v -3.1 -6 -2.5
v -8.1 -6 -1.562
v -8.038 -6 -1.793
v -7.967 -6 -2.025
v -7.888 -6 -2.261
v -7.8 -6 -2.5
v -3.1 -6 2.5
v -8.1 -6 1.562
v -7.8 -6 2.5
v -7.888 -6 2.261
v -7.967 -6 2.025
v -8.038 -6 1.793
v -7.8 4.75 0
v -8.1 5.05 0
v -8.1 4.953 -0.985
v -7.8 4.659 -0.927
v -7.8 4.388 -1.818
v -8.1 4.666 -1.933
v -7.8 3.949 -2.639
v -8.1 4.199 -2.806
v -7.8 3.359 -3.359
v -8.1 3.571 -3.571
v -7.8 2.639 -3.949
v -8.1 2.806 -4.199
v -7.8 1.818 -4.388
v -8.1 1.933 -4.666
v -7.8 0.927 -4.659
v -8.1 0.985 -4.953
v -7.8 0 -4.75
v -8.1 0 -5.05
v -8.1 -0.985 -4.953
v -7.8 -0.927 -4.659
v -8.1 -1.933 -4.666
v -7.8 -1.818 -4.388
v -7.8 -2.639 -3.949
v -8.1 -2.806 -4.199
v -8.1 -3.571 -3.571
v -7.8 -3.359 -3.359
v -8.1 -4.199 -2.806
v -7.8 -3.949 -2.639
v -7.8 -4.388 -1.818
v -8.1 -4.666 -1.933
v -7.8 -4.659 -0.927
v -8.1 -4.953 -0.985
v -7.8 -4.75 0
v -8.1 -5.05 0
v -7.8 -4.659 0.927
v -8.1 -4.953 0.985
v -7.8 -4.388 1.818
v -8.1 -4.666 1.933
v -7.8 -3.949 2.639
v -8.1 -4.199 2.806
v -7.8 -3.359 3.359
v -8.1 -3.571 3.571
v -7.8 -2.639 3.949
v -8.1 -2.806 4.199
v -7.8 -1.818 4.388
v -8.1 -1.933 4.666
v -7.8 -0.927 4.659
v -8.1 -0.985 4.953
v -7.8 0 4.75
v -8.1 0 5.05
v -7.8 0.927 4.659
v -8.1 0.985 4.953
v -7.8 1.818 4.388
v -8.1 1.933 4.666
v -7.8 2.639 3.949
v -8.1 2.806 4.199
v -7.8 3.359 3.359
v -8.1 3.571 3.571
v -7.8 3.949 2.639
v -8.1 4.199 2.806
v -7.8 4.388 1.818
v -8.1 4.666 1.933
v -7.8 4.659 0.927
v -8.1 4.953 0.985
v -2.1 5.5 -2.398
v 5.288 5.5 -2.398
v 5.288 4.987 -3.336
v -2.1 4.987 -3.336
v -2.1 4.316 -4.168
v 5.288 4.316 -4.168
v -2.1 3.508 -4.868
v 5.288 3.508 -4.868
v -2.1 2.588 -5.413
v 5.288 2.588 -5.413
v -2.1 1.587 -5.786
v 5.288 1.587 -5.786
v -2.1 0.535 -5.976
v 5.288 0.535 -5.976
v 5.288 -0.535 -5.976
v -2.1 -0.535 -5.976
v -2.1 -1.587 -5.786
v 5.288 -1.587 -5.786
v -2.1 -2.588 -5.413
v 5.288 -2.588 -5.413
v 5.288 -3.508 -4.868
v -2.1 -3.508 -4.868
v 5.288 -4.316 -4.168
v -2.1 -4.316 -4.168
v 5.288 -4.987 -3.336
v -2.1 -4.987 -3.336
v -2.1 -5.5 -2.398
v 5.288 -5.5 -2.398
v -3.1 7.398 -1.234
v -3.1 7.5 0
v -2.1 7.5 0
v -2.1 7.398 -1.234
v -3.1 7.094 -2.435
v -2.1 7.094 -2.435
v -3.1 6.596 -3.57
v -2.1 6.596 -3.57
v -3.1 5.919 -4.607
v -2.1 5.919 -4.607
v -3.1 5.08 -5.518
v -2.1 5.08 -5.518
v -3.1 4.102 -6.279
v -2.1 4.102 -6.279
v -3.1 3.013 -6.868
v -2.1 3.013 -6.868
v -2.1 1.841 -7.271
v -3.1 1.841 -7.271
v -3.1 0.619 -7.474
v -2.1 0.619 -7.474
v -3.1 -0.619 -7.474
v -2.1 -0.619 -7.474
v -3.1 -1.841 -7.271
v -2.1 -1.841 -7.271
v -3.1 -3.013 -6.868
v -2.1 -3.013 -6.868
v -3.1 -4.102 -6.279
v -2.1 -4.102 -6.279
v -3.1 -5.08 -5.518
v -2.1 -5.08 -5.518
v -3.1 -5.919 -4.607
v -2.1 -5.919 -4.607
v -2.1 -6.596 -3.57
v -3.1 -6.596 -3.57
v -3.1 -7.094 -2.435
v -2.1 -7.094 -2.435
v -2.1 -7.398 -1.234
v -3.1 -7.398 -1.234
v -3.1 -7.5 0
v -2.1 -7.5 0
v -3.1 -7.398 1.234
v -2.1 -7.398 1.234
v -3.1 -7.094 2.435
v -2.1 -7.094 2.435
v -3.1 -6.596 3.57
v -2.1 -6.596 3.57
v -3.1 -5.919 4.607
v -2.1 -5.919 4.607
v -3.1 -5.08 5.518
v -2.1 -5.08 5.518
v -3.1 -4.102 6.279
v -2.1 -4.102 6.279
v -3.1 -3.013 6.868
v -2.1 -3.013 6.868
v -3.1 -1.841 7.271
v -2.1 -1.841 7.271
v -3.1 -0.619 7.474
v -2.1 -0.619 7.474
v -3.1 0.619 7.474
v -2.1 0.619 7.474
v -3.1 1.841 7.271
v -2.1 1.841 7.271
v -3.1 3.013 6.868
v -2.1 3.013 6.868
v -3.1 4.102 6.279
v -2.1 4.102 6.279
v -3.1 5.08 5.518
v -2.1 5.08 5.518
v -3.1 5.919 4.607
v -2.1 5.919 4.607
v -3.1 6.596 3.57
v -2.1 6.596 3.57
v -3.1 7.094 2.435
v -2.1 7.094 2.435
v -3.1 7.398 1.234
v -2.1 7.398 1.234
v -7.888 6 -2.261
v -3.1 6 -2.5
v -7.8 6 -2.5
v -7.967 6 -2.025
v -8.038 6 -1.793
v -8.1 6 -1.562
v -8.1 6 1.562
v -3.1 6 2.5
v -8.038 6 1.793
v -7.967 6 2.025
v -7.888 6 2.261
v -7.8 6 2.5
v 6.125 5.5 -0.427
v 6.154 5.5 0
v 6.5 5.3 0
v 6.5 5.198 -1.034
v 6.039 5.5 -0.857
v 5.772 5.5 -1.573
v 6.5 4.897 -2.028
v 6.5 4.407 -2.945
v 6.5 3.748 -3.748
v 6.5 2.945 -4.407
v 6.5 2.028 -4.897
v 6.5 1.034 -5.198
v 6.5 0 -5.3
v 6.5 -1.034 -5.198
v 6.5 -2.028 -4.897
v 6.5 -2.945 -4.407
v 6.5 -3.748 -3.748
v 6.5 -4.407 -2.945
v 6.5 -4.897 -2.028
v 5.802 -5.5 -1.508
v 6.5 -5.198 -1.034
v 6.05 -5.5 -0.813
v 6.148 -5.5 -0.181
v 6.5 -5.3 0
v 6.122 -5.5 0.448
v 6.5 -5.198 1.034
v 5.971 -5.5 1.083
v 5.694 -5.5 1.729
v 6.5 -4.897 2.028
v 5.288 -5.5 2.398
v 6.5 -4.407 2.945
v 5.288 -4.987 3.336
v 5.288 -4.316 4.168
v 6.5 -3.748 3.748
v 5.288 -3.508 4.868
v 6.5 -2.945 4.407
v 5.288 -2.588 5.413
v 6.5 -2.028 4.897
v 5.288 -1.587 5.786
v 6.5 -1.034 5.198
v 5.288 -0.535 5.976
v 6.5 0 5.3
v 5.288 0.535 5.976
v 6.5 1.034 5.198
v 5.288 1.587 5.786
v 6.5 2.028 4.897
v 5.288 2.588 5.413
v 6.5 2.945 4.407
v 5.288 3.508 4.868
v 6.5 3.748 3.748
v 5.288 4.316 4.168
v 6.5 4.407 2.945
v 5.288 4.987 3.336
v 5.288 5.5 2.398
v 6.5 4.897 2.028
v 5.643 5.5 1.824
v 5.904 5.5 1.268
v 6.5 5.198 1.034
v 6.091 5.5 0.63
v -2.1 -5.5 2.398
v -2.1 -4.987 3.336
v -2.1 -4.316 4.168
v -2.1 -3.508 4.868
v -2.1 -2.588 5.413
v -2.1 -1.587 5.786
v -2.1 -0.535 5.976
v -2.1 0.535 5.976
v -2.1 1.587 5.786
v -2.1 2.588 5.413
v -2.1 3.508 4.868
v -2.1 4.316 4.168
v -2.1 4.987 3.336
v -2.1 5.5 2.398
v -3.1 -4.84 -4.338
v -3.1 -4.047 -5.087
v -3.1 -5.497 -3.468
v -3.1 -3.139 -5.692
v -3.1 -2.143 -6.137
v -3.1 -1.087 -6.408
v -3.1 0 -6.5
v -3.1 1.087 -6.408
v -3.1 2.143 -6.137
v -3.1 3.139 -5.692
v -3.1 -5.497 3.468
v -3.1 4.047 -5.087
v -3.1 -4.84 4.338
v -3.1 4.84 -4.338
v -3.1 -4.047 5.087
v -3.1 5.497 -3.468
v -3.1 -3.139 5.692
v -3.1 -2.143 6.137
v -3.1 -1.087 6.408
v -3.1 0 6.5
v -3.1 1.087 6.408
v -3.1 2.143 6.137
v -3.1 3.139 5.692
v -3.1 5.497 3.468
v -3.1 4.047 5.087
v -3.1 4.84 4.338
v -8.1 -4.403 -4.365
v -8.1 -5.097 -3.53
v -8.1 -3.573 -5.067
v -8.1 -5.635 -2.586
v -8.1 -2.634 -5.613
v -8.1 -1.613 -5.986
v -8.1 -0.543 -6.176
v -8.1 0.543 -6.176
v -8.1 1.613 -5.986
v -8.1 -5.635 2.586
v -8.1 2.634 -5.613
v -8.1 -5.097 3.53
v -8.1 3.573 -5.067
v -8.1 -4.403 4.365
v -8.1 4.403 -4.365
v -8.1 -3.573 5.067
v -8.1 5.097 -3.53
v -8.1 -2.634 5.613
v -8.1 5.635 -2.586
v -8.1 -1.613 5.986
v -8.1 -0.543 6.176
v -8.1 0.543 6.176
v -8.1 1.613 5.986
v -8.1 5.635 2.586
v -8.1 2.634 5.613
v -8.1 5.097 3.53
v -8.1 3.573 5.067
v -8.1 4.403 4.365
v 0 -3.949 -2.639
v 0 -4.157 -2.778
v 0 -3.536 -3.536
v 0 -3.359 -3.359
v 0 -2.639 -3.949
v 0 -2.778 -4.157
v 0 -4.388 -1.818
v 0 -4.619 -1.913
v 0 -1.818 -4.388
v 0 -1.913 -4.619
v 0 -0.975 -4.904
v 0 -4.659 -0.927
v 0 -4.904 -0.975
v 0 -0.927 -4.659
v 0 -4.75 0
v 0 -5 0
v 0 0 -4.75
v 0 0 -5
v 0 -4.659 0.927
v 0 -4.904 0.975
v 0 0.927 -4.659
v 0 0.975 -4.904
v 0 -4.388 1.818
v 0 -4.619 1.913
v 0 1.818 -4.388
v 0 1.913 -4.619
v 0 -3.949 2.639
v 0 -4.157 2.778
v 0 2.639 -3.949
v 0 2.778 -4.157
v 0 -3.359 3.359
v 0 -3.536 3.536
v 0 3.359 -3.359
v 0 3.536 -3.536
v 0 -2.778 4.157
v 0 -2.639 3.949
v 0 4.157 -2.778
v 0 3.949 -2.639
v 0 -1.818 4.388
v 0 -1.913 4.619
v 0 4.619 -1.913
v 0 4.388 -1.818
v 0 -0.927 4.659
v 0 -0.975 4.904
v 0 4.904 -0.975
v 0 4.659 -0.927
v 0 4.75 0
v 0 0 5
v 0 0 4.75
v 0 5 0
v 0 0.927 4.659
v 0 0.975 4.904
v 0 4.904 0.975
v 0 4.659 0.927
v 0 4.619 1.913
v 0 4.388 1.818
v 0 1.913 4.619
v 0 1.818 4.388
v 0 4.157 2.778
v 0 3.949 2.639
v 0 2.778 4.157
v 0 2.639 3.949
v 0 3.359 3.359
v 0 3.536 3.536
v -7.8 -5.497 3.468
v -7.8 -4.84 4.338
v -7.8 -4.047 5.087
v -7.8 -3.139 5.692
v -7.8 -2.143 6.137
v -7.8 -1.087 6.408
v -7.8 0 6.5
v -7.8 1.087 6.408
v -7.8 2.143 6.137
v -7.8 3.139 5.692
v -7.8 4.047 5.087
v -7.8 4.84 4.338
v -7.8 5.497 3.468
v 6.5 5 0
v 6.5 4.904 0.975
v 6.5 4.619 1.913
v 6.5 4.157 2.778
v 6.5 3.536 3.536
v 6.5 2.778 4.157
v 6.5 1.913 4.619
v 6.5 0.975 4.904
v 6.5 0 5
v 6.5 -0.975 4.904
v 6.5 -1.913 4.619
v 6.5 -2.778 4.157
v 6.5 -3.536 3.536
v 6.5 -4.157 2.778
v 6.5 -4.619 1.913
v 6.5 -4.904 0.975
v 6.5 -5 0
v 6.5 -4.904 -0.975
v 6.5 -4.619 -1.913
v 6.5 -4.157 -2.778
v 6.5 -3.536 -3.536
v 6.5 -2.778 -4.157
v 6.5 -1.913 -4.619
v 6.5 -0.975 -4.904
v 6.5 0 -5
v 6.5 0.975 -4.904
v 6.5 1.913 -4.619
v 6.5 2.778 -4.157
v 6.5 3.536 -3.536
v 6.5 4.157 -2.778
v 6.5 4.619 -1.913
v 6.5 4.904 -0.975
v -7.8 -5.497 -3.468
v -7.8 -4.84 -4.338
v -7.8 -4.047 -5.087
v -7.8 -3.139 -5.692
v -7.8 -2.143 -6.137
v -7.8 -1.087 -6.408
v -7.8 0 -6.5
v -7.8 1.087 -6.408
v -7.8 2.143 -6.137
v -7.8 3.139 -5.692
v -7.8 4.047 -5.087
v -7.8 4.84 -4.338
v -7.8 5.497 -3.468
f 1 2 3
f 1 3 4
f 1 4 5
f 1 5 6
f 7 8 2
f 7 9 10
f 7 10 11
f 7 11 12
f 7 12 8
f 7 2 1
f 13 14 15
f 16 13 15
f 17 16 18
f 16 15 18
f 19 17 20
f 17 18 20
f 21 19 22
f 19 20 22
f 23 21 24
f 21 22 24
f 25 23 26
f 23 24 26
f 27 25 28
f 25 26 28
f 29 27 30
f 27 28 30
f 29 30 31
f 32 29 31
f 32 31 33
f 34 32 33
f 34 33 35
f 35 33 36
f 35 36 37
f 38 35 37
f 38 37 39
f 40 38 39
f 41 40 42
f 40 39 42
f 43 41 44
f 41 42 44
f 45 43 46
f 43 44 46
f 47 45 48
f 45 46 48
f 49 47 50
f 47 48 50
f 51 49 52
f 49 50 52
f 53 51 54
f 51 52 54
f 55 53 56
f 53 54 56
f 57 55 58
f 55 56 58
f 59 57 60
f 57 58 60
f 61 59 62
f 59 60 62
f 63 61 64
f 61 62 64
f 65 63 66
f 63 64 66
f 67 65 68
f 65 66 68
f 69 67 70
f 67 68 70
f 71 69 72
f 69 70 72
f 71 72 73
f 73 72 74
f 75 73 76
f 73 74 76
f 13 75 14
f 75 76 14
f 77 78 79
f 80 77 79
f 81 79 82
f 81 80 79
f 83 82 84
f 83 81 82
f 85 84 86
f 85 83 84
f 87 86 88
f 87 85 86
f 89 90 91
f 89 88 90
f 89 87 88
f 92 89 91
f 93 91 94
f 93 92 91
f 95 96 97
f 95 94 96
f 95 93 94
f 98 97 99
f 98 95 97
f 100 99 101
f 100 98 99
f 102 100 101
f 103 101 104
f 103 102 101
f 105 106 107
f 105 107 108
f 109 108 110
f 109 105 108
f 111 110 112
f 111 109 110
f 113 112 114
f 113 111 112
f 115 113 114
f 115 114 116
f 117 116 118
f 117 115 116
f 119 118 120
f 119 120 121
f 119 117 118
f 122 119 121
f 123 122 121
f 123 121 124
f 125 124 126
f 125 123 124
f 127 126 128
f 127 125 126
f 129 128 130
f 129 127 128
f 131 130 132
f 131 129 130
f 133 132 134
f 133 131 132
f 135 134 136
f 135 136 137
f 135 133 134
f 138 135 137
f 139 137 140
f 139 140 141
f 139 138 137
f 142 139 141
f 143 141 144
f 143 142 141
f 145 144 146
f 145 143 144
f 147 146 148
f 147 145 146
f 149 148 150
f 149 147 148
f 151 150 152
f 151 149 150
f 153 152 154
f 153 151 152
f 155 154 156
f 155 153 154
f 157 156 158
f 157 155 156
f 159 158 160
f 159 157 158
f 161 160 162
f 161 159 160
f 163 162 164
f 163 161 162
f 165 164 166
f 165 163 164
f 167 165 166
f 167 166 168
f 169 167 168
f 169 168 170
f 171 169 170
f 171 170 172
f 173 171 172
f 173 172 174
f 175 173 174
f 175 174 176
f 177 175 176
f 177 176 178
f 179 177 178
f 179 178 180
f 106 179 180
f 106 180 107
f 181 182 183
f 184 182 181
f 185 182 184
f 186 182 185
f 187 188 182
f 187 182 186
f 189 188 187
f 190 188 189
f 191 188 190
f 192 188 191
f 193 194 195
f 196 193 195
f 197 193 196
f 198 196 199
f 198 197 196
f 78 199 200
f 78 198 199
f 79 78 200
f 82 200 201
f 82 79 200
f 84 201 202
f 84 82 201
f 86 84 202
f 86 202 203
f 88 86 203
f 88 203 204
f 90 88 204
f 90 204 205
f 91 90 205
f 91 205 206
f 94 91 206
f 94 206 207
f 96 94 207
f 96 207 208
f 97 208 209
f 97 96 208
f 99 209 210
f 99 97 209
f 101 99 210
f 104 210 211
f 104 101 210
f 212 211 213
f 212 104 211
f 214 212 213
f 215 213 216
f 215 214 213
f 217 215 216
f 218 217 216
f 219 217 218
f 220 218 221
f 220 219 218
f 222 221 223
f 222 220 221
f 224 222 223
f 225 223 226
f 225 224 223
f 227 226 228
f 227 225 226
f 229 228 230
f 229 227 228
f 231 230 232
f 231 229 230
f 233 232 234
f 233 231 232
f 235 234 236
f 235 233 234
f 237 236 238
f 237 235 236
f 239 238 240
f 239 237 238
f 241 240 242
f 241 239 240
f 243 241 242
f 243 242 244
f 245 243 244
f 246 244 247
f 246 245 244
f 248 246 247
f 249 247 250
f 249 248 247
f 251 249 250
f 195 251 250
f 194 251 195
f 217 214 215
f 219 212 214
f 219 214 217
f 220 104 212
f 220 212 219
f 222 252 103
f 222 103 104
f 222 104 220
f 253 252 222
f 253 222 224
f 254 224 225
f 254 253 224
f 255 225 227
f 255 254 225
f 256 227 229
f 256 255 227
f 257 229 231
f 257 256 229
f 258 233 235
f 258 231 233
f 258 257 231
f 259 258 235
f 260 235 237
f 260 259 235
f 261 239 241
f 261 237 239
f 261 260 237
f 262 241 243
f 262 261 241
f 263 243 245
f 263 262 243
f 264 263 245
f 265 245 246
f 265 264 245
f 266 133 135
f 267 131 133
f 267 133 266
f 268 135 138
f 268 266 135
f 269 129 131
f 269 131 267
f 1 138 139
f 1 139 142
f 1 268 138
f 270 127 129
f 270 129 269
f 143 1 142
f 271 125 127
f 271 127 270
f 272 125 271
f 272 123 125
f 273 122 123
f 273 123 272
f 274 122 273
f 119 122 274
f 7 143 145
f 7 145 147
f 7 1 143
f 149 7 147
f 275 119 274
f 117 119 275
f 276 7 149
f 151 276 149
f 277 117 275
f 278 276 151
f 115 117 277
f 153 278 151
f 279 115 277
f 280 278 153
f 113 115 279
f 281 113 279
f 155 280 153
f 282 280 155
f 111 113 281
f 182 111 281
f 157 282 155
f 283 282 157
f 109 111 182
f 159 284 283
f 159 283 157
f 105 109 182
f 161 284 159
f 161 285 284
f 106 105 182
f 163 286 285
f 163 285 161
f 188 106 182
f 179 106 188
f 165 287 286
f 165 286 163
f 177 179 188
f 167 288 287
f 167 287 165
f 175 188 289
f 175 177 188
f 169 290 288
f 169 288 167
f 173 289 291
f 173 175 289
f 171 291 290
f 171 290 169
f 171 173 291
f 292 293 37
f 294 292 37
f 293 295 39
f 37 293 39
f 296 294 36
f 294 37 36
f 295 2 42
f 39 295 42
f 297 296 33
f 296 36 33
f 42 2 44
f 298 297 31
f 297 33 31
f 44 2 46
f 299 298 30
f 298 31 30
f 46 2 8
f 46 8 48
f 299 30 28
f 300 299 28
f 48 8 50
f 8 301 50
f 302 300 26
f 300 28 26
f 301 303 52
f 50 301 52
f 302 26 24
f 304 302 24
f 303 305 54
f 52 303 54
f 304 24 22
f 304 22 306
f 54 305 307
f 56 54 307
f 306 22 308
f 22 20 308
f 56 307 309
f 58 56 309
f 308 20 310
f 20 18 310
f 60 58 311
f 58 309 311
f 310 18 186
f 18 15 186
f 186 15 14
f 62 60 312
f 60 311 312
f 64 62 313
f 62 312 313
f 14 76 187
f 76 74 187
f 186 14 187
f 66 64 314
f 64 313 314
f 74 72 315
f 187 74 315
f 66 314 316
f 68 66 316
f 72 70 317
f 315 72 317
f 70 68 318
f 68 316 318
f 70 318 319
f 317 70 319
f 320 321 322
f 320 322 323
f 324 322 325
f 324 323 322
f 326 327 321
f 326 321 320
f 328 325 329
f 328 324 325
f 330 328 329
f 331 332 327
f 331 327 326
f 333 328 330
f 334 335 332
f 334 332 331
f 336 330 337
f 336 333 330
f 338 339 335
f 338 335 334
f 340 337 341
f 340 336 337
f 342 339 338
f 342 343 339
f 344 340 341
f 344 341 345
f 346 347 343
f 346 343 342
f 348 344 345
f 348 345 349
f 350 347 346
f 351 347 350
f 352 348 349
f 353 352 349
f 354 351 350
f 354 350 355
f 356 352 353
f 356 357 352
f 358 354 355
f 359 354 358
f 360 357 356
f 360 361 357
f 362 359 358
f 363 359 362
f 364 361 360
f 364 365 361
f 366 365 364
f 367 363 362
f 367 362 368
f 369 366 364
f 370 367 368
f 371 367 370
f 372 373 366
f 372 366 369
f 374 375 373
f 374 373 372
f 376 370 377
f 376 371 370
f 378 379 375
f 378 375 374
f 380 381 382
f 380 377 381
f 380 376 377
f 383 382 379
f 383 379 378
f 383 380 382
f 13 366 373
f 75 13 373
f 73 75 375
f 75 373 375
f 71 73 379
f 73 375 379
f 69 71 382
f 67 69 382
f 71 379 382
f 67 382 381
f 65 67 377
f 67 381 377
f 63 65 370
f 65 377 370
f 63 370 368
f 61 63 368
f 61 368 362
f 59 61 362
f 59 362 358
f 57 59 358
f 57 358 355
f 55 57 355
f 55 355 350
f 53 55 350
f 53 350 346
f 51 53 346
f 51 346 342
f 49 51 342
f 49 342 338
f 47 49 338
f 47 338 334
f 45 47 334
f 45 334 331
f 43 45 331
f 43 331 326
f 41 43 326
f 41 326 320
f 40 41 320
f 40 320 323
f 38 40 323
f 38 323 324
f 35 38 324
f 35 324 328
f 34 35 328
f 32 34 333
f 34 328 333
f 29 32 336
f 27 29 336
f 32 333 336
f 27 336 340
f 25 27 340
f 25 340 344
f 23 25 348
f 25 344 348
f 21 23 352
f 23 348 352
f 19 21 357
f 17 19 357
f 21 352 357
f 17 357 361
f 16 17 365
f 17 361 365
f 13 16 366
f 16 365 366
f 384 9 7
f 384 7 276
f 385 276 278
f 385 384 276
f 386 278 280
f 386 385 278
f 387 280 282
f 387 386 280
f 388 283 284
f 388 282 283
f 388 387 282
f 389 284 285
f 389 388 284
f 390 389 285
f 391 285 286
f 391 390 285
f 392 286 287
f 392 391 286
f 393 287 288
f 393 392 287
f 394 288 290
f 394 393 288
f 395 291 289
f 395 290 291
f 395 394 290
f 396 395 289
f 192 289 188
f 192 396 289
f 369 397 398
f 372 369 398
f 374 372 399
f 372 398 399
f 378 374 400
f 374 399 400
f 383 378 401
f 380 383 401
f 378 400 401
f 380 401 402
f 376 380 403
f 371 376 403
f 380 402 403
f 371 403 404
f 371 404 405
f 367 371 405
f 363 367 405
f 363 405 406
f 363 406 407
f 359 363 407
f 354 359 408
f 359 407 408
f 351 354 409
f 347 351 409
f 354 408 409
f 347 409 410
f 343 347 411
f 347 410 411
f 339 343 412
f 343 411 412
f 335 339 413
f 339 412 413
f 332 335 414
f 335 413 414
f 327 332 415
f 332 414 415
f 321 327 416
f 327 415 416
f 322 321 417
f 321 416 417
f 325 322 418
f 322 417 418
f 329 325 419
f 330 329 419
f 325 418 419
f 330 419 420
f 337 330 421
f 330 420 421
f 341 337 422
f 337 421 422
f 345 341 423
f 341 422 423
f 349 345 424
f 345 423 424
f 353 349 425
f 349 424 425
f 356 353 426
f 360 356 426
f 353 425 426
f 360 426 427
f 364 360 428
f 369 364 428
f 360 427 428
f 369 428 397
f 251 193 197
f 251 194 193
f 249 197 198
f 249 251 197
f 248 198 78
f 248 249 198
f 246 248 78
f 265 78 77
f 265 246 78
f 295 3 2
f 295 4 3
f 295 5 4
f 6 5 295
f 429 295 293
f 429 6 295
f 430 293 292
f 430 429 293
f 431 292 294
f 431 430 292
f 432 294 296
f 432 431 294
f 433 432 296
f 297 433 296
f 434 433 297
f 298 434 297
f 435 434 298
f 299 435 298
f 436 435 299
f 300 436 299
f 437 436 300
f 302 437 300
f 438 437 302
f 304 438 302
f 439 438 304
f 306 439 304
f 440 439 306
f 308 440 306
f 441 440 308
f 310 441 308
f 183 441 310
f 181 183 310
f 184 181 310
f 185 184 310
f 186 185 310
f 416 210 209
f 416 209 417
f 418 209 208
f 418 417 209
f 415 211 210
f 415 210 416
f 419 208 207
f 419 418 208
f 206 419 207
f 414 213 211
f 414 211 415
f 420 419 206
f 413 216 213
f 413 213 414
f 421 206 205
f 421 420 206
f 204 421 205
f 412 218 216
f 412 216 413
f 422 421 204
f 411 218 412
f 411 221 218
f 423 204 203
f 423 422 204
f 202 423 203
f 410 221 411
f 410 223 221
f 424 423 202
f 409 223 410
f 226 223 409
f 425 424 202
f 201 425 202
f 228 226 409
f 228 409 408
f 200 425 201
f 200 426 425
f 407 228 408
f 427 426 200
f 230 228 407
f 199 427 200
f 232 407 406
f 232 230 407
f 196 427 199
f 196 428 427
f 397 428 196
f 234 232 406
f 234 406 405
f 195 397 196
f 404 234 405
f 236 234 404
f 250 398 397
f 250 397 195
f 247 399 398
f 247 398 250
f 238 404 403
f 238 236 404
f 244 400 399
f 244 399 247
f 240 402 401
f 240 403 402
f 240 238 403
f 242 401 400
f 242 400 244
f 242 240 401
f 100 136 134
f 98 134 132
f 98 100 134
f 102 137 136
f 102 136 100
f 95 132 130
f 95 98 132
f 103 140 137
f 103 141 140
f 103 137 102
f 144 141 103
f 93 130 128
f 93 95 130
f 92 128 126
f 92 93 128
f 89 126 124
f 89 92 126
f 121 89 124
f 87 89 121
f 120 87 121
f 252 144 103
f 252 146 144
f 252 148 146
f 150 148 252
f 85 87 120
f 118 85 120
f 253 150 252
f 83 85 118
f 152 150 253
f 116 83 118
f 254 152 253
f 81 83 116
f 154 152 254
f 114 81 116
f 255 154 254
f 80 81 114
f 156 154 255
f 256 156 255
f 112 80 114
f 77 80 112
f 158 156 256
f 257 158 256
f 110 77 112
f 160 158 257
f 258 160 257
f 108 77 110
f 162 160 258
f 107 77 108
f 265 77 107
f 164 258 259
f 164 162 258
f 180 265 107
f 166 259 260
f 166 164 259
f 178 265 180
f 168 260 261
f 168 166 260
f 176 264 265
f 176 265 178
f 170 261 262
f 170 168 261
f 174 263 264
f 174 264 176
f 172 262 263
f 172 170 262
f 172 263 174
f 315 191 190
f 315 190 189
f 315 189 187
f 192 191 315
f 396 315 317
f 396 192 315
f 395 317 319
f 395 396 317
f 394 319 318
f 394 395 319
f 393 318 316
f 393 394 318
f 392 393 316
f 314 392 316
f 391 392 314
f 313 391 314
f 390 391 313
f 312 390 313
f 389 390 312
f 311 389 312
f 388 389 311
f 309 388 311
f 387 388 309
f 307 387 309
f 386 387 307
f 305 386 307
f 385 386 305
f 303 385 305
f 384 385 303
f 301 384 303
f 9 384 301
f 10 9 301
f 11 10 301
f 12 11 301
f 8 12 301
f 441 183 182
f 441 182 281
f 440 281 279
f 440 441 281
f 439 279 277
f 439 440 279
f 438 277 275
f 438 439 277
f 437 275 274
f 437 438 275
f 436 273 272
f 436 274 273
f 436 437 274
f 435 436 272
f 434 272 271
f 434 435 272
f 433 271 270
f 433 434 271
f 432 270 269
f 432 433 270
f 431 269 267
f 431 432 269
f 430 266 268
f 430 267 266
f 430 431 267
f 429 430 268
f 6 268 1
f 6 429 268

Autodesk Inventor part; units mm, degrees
ref_plane "YZ Plane" through (0, 0, 0) normal (1, 0, 0) x (0, 1, 0)
ref_plane "XY Plane" through (0, 0, 0) normal (0, 0, 1) x (1, 0, 0)
sketch "Эскиз1" plane through (0, 0, 0) normal (0, 0, 1) x (1, 0, 0)
  line L0 (-7.8, 4.75) -> (0, 4.75)
  line L1 (0, 4.75) -> (0, 5)
  line L2 (0, 5) -> (6.5, 5)
  line L3 (6.5, 5) -> (6.5, 5.3)
  line L4 (6.5, 5.3) -> (5.2876, 6)
  line L5 (5.2876, 6) -> (-2.1, 6)
  line L6 (-2.1, 6) -> (-2.1, 7.5)
  line L7 (-2.1, 7.5) -> (-3.1, 7.5)
  line L8 (-3.1, 7.5) -> (-3.1, 6.5)
  line L9 (-3.1, 6.5) -> (-7.8, 6.5)
  line L10 (-6.6244, 0) -> (6.6244, 0) construction
  line L11 (-8.1, 6.2) -> (-8.1, 5.05)
  line L12 (-7.8, 6.5) -> (-8.1, 6.2)
  line L13 (-8.1, 5.05) -> (-7.8, 4.75)
  point P0 (0, 0)
  point P1 (-8.1, 6.5)
  point P2 (-8.1, 4.75)
  point P3 (0, 0)
  dimension "d2" = 12
  dimension "d3" = 15
  dimension "d8" = 13
  dimension "d9" = 1
  dimension "d10" = 0.3
  dimension "d11" = 120
  dimension "d12" = 6.5
  dimension "d14" = 0.3
  dimension "d15" = 0.3
  dimension "d16" = 0.3
  dimension "d17" = 0.3
  dimension "d18" = 9.5
  dimension "d19" = 5
  dimension "d20" = 1
  dimension "d21" = 8.6
  dimension "inside" = 10
revolve "Вращение1" add sketch "Эскиз1" angle 360 about axis through (-6.6244, 0, 0) along (1, 0, 0)
thread "Резьба1" size "M14x1" class "6g" standard "ANSI Metric M Profile" full length
thread "Резьба2" size "M12x0.75" class "6g" standard "ANSI Metric M Profile" full length
ref_plane "РабПлоскость1" through (1.5938, 6, 0) normal (0, 1, 0) x (-1, 0, 0)
sketch "Эскиз2" plane through (1.5938, 6, 0) normal (0, 1, 0) x (-1, 0, 0)
  line L0 (3.6938, 5) -> (-6.3062, 5)
  line L1 (-6.3062, 5) -> (-6.3062, -5)
  line L2 (-6.3062, -5) -> (3.6938, -5)
  line L3 (3.6938, -5) -> (3.6938, 5)
  line L4 (3.6938, 7.5) -> (3.6938, -7.5) projected
  point P0 (1.5938, 0)
  point P1 (-6.3062, 0)
  point P2 (3.6938, 0)
  dimension "d28" = 10
  dimension "d29" = 10
extrude "Выдавливание1" cut sketch "Эскиз2" against normal blind 0.5
sketch "Эскиз3" plane through (1.5938, 6, 0) normal (0, 1, 0) x (-1, 0, 0)
  line L0 (4.6938, 7.5) -> (4.6938, -7.5) projected
  line L1 (4.6938, -4) -> (12.6938, -4)
  line L2 (12.6938, -4) -> (12.6938, 4)
  line L3 (12.6938, 4) -> (4.6938, 4)
  line L4 (4.6938, 4) -> (4.6938, -4)
  point P0 (1.5938, 0)
  point P1 (4.6938, 0)
  dimension "d32" = 8
  dimension "d33" = 8
extrude "Выдавливание2" cut sketch "Эскиз3" along normal blind 0.5
mirror "Зеркальное отражение1" about plane through (0, 0, 0) normal (0, 1, 0) of "Выдавливание1", "Выдавливание2"
equation "\"d15\" = d14"
equation "\"d16\" = d14"
equation "\"d17\" = d16"
equation "\"d29\" = d28"
properties part number "корпус разъема" material "Сталь, нержавеющая, полированная"
